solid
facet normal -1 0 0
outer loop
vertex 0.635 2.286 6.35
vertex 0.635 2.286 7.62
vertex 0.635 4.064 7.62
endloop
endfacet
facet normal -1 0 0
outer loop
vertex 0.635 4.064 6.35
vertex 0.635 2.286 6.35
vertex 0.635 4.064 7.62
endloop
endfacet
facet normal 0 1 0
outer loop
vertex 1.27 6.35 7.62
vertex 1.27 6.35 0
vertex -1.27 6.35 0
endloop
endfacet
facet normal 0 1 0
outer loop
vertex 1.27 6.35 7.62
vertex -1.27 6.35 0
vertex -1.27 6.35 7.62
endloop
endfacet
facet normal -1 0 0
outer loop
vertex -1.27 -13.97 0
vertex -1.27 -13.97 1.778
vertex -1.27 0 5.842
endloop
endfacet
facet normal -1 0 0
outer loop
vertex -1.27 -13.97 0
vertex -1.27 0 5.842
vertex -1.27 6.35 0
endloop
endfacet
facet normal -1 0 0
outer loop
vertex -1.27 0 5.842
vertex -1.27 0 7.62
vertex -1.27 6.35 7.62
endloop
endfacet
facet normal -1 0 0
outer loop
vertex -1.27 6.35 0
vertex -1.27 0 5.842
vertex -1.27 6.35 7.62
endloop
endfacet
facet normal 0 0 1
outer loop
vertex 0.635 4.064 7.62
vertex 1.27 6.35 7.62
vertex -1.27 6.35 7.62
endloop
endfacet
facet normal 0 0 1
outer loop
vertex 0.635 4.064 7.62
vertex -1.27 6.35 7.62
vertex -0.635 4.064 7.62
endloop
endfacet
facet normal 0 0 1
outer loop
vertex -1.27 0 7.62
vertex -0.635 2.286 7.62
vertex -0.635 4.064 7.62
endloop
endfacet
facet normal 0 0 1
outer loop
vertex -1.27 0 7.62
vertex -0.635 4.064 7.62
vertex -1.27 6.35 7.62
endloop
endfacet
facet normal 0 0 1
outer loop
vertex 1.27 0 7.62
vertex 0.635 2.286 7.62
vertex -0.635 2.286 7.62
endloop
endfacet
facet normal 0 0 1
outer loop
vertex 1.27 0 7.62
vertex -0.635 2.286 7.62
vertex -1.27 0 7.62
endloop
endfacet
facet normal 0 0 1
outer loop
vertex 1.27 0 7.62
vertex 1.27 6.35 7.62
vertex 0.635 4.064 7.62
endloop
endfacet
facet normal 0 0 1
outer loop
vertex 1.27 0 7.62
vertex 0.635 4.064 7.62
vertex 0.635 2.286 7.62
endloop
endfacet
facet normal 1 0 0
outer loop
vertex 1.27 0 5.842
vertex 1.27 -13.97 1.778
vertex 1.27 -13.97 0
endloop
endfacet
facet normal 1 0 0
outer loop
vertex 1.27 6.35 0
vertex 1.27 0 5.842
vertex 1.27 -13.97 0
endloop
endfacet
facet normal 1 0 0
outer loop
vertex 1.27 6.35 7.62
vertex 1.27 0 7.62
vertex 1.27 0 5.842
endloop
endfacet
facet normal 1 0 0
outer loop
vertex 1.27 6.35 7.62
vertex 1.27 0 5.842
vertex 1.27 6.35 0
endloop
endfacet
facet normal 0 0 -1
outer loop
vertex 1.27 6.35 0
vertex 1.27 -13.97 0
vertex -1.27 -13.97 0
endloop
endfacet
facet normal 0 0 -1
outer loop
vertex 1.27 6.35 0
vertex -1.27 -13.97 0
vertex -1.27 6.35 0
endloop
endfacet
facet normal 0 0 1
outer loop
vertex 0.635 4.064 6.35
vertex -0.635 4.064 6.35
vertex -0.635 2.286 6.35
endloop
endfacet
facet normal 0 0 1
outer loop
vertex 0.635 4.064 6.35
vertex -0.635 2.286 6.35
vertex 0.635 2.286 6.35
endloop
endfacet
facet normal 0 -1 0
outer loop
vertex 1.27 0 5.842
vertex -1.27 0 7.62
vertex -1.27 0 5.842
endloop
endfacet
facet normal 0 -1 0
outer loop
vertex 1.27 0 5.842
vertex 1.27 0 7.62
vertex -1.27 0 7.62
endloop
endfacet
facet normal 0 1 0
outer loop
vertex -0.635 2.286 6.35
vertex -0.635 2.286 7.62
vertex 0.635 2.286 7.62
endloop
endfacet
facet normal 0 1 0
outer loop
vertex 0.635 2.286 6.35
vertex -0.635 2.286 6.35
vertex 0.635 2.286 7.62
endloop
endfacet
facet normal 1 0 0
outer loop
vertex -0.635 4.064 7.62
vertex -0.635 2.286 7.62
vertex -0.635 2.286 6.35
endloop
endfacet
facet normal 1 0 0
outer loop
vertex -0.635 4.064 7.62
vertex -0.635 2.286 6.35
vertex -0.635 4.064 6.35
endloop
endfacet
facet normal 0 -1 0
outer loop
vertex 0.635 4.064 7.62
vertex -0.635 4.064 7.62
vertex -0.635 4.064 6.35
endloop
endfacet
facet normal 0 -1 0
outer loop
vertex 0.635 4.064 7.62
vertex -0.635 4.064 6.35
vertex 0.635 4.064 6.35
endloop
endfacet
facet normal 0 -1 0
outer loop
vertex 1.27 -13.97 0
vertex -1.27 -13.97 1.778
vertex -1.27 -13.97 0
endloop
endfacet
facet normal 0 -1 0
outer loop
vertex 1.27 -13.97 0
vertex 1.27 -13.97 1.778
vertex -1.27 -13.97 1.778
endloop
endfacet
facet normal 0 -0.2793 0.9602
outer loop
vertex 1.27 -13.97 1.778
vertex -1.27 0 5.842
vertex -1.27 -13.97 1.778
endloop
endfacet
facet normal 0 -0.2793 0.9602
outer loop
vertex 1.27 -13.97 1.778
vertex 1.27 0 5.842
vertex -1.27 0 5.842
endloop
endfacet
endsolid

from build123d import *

# Parameters (mm, degrees)
F1_DEPTH = 1.27
F3_W     = 1.27
F3_H     = 1.778
F4_DEPTH = 1.27


with BuildPart() as f1:
    # F0 (on Right) → F1 (new body, symmetric)
    with BuildSketch(Plane.YZ):
        Polygon((-13.97, 1.778), (-13.97, 0), (6.35, 0), (6.35, 7.62), (0, 7.62), (0, 5.842), align=None)
    extrude(amount=F1_DEPTH, both=True)

    # F3 (on offset) → F4 (cut)
    with BuildSketch(Plane.XY.offset(7.62)):
        with Locations((0, 3.175)):
            Rectangle(F3_W, F3_H)
    extrude(amount=-F4_DEPTH, mode=Mode.SUBTRACT)


solid = f1.part
